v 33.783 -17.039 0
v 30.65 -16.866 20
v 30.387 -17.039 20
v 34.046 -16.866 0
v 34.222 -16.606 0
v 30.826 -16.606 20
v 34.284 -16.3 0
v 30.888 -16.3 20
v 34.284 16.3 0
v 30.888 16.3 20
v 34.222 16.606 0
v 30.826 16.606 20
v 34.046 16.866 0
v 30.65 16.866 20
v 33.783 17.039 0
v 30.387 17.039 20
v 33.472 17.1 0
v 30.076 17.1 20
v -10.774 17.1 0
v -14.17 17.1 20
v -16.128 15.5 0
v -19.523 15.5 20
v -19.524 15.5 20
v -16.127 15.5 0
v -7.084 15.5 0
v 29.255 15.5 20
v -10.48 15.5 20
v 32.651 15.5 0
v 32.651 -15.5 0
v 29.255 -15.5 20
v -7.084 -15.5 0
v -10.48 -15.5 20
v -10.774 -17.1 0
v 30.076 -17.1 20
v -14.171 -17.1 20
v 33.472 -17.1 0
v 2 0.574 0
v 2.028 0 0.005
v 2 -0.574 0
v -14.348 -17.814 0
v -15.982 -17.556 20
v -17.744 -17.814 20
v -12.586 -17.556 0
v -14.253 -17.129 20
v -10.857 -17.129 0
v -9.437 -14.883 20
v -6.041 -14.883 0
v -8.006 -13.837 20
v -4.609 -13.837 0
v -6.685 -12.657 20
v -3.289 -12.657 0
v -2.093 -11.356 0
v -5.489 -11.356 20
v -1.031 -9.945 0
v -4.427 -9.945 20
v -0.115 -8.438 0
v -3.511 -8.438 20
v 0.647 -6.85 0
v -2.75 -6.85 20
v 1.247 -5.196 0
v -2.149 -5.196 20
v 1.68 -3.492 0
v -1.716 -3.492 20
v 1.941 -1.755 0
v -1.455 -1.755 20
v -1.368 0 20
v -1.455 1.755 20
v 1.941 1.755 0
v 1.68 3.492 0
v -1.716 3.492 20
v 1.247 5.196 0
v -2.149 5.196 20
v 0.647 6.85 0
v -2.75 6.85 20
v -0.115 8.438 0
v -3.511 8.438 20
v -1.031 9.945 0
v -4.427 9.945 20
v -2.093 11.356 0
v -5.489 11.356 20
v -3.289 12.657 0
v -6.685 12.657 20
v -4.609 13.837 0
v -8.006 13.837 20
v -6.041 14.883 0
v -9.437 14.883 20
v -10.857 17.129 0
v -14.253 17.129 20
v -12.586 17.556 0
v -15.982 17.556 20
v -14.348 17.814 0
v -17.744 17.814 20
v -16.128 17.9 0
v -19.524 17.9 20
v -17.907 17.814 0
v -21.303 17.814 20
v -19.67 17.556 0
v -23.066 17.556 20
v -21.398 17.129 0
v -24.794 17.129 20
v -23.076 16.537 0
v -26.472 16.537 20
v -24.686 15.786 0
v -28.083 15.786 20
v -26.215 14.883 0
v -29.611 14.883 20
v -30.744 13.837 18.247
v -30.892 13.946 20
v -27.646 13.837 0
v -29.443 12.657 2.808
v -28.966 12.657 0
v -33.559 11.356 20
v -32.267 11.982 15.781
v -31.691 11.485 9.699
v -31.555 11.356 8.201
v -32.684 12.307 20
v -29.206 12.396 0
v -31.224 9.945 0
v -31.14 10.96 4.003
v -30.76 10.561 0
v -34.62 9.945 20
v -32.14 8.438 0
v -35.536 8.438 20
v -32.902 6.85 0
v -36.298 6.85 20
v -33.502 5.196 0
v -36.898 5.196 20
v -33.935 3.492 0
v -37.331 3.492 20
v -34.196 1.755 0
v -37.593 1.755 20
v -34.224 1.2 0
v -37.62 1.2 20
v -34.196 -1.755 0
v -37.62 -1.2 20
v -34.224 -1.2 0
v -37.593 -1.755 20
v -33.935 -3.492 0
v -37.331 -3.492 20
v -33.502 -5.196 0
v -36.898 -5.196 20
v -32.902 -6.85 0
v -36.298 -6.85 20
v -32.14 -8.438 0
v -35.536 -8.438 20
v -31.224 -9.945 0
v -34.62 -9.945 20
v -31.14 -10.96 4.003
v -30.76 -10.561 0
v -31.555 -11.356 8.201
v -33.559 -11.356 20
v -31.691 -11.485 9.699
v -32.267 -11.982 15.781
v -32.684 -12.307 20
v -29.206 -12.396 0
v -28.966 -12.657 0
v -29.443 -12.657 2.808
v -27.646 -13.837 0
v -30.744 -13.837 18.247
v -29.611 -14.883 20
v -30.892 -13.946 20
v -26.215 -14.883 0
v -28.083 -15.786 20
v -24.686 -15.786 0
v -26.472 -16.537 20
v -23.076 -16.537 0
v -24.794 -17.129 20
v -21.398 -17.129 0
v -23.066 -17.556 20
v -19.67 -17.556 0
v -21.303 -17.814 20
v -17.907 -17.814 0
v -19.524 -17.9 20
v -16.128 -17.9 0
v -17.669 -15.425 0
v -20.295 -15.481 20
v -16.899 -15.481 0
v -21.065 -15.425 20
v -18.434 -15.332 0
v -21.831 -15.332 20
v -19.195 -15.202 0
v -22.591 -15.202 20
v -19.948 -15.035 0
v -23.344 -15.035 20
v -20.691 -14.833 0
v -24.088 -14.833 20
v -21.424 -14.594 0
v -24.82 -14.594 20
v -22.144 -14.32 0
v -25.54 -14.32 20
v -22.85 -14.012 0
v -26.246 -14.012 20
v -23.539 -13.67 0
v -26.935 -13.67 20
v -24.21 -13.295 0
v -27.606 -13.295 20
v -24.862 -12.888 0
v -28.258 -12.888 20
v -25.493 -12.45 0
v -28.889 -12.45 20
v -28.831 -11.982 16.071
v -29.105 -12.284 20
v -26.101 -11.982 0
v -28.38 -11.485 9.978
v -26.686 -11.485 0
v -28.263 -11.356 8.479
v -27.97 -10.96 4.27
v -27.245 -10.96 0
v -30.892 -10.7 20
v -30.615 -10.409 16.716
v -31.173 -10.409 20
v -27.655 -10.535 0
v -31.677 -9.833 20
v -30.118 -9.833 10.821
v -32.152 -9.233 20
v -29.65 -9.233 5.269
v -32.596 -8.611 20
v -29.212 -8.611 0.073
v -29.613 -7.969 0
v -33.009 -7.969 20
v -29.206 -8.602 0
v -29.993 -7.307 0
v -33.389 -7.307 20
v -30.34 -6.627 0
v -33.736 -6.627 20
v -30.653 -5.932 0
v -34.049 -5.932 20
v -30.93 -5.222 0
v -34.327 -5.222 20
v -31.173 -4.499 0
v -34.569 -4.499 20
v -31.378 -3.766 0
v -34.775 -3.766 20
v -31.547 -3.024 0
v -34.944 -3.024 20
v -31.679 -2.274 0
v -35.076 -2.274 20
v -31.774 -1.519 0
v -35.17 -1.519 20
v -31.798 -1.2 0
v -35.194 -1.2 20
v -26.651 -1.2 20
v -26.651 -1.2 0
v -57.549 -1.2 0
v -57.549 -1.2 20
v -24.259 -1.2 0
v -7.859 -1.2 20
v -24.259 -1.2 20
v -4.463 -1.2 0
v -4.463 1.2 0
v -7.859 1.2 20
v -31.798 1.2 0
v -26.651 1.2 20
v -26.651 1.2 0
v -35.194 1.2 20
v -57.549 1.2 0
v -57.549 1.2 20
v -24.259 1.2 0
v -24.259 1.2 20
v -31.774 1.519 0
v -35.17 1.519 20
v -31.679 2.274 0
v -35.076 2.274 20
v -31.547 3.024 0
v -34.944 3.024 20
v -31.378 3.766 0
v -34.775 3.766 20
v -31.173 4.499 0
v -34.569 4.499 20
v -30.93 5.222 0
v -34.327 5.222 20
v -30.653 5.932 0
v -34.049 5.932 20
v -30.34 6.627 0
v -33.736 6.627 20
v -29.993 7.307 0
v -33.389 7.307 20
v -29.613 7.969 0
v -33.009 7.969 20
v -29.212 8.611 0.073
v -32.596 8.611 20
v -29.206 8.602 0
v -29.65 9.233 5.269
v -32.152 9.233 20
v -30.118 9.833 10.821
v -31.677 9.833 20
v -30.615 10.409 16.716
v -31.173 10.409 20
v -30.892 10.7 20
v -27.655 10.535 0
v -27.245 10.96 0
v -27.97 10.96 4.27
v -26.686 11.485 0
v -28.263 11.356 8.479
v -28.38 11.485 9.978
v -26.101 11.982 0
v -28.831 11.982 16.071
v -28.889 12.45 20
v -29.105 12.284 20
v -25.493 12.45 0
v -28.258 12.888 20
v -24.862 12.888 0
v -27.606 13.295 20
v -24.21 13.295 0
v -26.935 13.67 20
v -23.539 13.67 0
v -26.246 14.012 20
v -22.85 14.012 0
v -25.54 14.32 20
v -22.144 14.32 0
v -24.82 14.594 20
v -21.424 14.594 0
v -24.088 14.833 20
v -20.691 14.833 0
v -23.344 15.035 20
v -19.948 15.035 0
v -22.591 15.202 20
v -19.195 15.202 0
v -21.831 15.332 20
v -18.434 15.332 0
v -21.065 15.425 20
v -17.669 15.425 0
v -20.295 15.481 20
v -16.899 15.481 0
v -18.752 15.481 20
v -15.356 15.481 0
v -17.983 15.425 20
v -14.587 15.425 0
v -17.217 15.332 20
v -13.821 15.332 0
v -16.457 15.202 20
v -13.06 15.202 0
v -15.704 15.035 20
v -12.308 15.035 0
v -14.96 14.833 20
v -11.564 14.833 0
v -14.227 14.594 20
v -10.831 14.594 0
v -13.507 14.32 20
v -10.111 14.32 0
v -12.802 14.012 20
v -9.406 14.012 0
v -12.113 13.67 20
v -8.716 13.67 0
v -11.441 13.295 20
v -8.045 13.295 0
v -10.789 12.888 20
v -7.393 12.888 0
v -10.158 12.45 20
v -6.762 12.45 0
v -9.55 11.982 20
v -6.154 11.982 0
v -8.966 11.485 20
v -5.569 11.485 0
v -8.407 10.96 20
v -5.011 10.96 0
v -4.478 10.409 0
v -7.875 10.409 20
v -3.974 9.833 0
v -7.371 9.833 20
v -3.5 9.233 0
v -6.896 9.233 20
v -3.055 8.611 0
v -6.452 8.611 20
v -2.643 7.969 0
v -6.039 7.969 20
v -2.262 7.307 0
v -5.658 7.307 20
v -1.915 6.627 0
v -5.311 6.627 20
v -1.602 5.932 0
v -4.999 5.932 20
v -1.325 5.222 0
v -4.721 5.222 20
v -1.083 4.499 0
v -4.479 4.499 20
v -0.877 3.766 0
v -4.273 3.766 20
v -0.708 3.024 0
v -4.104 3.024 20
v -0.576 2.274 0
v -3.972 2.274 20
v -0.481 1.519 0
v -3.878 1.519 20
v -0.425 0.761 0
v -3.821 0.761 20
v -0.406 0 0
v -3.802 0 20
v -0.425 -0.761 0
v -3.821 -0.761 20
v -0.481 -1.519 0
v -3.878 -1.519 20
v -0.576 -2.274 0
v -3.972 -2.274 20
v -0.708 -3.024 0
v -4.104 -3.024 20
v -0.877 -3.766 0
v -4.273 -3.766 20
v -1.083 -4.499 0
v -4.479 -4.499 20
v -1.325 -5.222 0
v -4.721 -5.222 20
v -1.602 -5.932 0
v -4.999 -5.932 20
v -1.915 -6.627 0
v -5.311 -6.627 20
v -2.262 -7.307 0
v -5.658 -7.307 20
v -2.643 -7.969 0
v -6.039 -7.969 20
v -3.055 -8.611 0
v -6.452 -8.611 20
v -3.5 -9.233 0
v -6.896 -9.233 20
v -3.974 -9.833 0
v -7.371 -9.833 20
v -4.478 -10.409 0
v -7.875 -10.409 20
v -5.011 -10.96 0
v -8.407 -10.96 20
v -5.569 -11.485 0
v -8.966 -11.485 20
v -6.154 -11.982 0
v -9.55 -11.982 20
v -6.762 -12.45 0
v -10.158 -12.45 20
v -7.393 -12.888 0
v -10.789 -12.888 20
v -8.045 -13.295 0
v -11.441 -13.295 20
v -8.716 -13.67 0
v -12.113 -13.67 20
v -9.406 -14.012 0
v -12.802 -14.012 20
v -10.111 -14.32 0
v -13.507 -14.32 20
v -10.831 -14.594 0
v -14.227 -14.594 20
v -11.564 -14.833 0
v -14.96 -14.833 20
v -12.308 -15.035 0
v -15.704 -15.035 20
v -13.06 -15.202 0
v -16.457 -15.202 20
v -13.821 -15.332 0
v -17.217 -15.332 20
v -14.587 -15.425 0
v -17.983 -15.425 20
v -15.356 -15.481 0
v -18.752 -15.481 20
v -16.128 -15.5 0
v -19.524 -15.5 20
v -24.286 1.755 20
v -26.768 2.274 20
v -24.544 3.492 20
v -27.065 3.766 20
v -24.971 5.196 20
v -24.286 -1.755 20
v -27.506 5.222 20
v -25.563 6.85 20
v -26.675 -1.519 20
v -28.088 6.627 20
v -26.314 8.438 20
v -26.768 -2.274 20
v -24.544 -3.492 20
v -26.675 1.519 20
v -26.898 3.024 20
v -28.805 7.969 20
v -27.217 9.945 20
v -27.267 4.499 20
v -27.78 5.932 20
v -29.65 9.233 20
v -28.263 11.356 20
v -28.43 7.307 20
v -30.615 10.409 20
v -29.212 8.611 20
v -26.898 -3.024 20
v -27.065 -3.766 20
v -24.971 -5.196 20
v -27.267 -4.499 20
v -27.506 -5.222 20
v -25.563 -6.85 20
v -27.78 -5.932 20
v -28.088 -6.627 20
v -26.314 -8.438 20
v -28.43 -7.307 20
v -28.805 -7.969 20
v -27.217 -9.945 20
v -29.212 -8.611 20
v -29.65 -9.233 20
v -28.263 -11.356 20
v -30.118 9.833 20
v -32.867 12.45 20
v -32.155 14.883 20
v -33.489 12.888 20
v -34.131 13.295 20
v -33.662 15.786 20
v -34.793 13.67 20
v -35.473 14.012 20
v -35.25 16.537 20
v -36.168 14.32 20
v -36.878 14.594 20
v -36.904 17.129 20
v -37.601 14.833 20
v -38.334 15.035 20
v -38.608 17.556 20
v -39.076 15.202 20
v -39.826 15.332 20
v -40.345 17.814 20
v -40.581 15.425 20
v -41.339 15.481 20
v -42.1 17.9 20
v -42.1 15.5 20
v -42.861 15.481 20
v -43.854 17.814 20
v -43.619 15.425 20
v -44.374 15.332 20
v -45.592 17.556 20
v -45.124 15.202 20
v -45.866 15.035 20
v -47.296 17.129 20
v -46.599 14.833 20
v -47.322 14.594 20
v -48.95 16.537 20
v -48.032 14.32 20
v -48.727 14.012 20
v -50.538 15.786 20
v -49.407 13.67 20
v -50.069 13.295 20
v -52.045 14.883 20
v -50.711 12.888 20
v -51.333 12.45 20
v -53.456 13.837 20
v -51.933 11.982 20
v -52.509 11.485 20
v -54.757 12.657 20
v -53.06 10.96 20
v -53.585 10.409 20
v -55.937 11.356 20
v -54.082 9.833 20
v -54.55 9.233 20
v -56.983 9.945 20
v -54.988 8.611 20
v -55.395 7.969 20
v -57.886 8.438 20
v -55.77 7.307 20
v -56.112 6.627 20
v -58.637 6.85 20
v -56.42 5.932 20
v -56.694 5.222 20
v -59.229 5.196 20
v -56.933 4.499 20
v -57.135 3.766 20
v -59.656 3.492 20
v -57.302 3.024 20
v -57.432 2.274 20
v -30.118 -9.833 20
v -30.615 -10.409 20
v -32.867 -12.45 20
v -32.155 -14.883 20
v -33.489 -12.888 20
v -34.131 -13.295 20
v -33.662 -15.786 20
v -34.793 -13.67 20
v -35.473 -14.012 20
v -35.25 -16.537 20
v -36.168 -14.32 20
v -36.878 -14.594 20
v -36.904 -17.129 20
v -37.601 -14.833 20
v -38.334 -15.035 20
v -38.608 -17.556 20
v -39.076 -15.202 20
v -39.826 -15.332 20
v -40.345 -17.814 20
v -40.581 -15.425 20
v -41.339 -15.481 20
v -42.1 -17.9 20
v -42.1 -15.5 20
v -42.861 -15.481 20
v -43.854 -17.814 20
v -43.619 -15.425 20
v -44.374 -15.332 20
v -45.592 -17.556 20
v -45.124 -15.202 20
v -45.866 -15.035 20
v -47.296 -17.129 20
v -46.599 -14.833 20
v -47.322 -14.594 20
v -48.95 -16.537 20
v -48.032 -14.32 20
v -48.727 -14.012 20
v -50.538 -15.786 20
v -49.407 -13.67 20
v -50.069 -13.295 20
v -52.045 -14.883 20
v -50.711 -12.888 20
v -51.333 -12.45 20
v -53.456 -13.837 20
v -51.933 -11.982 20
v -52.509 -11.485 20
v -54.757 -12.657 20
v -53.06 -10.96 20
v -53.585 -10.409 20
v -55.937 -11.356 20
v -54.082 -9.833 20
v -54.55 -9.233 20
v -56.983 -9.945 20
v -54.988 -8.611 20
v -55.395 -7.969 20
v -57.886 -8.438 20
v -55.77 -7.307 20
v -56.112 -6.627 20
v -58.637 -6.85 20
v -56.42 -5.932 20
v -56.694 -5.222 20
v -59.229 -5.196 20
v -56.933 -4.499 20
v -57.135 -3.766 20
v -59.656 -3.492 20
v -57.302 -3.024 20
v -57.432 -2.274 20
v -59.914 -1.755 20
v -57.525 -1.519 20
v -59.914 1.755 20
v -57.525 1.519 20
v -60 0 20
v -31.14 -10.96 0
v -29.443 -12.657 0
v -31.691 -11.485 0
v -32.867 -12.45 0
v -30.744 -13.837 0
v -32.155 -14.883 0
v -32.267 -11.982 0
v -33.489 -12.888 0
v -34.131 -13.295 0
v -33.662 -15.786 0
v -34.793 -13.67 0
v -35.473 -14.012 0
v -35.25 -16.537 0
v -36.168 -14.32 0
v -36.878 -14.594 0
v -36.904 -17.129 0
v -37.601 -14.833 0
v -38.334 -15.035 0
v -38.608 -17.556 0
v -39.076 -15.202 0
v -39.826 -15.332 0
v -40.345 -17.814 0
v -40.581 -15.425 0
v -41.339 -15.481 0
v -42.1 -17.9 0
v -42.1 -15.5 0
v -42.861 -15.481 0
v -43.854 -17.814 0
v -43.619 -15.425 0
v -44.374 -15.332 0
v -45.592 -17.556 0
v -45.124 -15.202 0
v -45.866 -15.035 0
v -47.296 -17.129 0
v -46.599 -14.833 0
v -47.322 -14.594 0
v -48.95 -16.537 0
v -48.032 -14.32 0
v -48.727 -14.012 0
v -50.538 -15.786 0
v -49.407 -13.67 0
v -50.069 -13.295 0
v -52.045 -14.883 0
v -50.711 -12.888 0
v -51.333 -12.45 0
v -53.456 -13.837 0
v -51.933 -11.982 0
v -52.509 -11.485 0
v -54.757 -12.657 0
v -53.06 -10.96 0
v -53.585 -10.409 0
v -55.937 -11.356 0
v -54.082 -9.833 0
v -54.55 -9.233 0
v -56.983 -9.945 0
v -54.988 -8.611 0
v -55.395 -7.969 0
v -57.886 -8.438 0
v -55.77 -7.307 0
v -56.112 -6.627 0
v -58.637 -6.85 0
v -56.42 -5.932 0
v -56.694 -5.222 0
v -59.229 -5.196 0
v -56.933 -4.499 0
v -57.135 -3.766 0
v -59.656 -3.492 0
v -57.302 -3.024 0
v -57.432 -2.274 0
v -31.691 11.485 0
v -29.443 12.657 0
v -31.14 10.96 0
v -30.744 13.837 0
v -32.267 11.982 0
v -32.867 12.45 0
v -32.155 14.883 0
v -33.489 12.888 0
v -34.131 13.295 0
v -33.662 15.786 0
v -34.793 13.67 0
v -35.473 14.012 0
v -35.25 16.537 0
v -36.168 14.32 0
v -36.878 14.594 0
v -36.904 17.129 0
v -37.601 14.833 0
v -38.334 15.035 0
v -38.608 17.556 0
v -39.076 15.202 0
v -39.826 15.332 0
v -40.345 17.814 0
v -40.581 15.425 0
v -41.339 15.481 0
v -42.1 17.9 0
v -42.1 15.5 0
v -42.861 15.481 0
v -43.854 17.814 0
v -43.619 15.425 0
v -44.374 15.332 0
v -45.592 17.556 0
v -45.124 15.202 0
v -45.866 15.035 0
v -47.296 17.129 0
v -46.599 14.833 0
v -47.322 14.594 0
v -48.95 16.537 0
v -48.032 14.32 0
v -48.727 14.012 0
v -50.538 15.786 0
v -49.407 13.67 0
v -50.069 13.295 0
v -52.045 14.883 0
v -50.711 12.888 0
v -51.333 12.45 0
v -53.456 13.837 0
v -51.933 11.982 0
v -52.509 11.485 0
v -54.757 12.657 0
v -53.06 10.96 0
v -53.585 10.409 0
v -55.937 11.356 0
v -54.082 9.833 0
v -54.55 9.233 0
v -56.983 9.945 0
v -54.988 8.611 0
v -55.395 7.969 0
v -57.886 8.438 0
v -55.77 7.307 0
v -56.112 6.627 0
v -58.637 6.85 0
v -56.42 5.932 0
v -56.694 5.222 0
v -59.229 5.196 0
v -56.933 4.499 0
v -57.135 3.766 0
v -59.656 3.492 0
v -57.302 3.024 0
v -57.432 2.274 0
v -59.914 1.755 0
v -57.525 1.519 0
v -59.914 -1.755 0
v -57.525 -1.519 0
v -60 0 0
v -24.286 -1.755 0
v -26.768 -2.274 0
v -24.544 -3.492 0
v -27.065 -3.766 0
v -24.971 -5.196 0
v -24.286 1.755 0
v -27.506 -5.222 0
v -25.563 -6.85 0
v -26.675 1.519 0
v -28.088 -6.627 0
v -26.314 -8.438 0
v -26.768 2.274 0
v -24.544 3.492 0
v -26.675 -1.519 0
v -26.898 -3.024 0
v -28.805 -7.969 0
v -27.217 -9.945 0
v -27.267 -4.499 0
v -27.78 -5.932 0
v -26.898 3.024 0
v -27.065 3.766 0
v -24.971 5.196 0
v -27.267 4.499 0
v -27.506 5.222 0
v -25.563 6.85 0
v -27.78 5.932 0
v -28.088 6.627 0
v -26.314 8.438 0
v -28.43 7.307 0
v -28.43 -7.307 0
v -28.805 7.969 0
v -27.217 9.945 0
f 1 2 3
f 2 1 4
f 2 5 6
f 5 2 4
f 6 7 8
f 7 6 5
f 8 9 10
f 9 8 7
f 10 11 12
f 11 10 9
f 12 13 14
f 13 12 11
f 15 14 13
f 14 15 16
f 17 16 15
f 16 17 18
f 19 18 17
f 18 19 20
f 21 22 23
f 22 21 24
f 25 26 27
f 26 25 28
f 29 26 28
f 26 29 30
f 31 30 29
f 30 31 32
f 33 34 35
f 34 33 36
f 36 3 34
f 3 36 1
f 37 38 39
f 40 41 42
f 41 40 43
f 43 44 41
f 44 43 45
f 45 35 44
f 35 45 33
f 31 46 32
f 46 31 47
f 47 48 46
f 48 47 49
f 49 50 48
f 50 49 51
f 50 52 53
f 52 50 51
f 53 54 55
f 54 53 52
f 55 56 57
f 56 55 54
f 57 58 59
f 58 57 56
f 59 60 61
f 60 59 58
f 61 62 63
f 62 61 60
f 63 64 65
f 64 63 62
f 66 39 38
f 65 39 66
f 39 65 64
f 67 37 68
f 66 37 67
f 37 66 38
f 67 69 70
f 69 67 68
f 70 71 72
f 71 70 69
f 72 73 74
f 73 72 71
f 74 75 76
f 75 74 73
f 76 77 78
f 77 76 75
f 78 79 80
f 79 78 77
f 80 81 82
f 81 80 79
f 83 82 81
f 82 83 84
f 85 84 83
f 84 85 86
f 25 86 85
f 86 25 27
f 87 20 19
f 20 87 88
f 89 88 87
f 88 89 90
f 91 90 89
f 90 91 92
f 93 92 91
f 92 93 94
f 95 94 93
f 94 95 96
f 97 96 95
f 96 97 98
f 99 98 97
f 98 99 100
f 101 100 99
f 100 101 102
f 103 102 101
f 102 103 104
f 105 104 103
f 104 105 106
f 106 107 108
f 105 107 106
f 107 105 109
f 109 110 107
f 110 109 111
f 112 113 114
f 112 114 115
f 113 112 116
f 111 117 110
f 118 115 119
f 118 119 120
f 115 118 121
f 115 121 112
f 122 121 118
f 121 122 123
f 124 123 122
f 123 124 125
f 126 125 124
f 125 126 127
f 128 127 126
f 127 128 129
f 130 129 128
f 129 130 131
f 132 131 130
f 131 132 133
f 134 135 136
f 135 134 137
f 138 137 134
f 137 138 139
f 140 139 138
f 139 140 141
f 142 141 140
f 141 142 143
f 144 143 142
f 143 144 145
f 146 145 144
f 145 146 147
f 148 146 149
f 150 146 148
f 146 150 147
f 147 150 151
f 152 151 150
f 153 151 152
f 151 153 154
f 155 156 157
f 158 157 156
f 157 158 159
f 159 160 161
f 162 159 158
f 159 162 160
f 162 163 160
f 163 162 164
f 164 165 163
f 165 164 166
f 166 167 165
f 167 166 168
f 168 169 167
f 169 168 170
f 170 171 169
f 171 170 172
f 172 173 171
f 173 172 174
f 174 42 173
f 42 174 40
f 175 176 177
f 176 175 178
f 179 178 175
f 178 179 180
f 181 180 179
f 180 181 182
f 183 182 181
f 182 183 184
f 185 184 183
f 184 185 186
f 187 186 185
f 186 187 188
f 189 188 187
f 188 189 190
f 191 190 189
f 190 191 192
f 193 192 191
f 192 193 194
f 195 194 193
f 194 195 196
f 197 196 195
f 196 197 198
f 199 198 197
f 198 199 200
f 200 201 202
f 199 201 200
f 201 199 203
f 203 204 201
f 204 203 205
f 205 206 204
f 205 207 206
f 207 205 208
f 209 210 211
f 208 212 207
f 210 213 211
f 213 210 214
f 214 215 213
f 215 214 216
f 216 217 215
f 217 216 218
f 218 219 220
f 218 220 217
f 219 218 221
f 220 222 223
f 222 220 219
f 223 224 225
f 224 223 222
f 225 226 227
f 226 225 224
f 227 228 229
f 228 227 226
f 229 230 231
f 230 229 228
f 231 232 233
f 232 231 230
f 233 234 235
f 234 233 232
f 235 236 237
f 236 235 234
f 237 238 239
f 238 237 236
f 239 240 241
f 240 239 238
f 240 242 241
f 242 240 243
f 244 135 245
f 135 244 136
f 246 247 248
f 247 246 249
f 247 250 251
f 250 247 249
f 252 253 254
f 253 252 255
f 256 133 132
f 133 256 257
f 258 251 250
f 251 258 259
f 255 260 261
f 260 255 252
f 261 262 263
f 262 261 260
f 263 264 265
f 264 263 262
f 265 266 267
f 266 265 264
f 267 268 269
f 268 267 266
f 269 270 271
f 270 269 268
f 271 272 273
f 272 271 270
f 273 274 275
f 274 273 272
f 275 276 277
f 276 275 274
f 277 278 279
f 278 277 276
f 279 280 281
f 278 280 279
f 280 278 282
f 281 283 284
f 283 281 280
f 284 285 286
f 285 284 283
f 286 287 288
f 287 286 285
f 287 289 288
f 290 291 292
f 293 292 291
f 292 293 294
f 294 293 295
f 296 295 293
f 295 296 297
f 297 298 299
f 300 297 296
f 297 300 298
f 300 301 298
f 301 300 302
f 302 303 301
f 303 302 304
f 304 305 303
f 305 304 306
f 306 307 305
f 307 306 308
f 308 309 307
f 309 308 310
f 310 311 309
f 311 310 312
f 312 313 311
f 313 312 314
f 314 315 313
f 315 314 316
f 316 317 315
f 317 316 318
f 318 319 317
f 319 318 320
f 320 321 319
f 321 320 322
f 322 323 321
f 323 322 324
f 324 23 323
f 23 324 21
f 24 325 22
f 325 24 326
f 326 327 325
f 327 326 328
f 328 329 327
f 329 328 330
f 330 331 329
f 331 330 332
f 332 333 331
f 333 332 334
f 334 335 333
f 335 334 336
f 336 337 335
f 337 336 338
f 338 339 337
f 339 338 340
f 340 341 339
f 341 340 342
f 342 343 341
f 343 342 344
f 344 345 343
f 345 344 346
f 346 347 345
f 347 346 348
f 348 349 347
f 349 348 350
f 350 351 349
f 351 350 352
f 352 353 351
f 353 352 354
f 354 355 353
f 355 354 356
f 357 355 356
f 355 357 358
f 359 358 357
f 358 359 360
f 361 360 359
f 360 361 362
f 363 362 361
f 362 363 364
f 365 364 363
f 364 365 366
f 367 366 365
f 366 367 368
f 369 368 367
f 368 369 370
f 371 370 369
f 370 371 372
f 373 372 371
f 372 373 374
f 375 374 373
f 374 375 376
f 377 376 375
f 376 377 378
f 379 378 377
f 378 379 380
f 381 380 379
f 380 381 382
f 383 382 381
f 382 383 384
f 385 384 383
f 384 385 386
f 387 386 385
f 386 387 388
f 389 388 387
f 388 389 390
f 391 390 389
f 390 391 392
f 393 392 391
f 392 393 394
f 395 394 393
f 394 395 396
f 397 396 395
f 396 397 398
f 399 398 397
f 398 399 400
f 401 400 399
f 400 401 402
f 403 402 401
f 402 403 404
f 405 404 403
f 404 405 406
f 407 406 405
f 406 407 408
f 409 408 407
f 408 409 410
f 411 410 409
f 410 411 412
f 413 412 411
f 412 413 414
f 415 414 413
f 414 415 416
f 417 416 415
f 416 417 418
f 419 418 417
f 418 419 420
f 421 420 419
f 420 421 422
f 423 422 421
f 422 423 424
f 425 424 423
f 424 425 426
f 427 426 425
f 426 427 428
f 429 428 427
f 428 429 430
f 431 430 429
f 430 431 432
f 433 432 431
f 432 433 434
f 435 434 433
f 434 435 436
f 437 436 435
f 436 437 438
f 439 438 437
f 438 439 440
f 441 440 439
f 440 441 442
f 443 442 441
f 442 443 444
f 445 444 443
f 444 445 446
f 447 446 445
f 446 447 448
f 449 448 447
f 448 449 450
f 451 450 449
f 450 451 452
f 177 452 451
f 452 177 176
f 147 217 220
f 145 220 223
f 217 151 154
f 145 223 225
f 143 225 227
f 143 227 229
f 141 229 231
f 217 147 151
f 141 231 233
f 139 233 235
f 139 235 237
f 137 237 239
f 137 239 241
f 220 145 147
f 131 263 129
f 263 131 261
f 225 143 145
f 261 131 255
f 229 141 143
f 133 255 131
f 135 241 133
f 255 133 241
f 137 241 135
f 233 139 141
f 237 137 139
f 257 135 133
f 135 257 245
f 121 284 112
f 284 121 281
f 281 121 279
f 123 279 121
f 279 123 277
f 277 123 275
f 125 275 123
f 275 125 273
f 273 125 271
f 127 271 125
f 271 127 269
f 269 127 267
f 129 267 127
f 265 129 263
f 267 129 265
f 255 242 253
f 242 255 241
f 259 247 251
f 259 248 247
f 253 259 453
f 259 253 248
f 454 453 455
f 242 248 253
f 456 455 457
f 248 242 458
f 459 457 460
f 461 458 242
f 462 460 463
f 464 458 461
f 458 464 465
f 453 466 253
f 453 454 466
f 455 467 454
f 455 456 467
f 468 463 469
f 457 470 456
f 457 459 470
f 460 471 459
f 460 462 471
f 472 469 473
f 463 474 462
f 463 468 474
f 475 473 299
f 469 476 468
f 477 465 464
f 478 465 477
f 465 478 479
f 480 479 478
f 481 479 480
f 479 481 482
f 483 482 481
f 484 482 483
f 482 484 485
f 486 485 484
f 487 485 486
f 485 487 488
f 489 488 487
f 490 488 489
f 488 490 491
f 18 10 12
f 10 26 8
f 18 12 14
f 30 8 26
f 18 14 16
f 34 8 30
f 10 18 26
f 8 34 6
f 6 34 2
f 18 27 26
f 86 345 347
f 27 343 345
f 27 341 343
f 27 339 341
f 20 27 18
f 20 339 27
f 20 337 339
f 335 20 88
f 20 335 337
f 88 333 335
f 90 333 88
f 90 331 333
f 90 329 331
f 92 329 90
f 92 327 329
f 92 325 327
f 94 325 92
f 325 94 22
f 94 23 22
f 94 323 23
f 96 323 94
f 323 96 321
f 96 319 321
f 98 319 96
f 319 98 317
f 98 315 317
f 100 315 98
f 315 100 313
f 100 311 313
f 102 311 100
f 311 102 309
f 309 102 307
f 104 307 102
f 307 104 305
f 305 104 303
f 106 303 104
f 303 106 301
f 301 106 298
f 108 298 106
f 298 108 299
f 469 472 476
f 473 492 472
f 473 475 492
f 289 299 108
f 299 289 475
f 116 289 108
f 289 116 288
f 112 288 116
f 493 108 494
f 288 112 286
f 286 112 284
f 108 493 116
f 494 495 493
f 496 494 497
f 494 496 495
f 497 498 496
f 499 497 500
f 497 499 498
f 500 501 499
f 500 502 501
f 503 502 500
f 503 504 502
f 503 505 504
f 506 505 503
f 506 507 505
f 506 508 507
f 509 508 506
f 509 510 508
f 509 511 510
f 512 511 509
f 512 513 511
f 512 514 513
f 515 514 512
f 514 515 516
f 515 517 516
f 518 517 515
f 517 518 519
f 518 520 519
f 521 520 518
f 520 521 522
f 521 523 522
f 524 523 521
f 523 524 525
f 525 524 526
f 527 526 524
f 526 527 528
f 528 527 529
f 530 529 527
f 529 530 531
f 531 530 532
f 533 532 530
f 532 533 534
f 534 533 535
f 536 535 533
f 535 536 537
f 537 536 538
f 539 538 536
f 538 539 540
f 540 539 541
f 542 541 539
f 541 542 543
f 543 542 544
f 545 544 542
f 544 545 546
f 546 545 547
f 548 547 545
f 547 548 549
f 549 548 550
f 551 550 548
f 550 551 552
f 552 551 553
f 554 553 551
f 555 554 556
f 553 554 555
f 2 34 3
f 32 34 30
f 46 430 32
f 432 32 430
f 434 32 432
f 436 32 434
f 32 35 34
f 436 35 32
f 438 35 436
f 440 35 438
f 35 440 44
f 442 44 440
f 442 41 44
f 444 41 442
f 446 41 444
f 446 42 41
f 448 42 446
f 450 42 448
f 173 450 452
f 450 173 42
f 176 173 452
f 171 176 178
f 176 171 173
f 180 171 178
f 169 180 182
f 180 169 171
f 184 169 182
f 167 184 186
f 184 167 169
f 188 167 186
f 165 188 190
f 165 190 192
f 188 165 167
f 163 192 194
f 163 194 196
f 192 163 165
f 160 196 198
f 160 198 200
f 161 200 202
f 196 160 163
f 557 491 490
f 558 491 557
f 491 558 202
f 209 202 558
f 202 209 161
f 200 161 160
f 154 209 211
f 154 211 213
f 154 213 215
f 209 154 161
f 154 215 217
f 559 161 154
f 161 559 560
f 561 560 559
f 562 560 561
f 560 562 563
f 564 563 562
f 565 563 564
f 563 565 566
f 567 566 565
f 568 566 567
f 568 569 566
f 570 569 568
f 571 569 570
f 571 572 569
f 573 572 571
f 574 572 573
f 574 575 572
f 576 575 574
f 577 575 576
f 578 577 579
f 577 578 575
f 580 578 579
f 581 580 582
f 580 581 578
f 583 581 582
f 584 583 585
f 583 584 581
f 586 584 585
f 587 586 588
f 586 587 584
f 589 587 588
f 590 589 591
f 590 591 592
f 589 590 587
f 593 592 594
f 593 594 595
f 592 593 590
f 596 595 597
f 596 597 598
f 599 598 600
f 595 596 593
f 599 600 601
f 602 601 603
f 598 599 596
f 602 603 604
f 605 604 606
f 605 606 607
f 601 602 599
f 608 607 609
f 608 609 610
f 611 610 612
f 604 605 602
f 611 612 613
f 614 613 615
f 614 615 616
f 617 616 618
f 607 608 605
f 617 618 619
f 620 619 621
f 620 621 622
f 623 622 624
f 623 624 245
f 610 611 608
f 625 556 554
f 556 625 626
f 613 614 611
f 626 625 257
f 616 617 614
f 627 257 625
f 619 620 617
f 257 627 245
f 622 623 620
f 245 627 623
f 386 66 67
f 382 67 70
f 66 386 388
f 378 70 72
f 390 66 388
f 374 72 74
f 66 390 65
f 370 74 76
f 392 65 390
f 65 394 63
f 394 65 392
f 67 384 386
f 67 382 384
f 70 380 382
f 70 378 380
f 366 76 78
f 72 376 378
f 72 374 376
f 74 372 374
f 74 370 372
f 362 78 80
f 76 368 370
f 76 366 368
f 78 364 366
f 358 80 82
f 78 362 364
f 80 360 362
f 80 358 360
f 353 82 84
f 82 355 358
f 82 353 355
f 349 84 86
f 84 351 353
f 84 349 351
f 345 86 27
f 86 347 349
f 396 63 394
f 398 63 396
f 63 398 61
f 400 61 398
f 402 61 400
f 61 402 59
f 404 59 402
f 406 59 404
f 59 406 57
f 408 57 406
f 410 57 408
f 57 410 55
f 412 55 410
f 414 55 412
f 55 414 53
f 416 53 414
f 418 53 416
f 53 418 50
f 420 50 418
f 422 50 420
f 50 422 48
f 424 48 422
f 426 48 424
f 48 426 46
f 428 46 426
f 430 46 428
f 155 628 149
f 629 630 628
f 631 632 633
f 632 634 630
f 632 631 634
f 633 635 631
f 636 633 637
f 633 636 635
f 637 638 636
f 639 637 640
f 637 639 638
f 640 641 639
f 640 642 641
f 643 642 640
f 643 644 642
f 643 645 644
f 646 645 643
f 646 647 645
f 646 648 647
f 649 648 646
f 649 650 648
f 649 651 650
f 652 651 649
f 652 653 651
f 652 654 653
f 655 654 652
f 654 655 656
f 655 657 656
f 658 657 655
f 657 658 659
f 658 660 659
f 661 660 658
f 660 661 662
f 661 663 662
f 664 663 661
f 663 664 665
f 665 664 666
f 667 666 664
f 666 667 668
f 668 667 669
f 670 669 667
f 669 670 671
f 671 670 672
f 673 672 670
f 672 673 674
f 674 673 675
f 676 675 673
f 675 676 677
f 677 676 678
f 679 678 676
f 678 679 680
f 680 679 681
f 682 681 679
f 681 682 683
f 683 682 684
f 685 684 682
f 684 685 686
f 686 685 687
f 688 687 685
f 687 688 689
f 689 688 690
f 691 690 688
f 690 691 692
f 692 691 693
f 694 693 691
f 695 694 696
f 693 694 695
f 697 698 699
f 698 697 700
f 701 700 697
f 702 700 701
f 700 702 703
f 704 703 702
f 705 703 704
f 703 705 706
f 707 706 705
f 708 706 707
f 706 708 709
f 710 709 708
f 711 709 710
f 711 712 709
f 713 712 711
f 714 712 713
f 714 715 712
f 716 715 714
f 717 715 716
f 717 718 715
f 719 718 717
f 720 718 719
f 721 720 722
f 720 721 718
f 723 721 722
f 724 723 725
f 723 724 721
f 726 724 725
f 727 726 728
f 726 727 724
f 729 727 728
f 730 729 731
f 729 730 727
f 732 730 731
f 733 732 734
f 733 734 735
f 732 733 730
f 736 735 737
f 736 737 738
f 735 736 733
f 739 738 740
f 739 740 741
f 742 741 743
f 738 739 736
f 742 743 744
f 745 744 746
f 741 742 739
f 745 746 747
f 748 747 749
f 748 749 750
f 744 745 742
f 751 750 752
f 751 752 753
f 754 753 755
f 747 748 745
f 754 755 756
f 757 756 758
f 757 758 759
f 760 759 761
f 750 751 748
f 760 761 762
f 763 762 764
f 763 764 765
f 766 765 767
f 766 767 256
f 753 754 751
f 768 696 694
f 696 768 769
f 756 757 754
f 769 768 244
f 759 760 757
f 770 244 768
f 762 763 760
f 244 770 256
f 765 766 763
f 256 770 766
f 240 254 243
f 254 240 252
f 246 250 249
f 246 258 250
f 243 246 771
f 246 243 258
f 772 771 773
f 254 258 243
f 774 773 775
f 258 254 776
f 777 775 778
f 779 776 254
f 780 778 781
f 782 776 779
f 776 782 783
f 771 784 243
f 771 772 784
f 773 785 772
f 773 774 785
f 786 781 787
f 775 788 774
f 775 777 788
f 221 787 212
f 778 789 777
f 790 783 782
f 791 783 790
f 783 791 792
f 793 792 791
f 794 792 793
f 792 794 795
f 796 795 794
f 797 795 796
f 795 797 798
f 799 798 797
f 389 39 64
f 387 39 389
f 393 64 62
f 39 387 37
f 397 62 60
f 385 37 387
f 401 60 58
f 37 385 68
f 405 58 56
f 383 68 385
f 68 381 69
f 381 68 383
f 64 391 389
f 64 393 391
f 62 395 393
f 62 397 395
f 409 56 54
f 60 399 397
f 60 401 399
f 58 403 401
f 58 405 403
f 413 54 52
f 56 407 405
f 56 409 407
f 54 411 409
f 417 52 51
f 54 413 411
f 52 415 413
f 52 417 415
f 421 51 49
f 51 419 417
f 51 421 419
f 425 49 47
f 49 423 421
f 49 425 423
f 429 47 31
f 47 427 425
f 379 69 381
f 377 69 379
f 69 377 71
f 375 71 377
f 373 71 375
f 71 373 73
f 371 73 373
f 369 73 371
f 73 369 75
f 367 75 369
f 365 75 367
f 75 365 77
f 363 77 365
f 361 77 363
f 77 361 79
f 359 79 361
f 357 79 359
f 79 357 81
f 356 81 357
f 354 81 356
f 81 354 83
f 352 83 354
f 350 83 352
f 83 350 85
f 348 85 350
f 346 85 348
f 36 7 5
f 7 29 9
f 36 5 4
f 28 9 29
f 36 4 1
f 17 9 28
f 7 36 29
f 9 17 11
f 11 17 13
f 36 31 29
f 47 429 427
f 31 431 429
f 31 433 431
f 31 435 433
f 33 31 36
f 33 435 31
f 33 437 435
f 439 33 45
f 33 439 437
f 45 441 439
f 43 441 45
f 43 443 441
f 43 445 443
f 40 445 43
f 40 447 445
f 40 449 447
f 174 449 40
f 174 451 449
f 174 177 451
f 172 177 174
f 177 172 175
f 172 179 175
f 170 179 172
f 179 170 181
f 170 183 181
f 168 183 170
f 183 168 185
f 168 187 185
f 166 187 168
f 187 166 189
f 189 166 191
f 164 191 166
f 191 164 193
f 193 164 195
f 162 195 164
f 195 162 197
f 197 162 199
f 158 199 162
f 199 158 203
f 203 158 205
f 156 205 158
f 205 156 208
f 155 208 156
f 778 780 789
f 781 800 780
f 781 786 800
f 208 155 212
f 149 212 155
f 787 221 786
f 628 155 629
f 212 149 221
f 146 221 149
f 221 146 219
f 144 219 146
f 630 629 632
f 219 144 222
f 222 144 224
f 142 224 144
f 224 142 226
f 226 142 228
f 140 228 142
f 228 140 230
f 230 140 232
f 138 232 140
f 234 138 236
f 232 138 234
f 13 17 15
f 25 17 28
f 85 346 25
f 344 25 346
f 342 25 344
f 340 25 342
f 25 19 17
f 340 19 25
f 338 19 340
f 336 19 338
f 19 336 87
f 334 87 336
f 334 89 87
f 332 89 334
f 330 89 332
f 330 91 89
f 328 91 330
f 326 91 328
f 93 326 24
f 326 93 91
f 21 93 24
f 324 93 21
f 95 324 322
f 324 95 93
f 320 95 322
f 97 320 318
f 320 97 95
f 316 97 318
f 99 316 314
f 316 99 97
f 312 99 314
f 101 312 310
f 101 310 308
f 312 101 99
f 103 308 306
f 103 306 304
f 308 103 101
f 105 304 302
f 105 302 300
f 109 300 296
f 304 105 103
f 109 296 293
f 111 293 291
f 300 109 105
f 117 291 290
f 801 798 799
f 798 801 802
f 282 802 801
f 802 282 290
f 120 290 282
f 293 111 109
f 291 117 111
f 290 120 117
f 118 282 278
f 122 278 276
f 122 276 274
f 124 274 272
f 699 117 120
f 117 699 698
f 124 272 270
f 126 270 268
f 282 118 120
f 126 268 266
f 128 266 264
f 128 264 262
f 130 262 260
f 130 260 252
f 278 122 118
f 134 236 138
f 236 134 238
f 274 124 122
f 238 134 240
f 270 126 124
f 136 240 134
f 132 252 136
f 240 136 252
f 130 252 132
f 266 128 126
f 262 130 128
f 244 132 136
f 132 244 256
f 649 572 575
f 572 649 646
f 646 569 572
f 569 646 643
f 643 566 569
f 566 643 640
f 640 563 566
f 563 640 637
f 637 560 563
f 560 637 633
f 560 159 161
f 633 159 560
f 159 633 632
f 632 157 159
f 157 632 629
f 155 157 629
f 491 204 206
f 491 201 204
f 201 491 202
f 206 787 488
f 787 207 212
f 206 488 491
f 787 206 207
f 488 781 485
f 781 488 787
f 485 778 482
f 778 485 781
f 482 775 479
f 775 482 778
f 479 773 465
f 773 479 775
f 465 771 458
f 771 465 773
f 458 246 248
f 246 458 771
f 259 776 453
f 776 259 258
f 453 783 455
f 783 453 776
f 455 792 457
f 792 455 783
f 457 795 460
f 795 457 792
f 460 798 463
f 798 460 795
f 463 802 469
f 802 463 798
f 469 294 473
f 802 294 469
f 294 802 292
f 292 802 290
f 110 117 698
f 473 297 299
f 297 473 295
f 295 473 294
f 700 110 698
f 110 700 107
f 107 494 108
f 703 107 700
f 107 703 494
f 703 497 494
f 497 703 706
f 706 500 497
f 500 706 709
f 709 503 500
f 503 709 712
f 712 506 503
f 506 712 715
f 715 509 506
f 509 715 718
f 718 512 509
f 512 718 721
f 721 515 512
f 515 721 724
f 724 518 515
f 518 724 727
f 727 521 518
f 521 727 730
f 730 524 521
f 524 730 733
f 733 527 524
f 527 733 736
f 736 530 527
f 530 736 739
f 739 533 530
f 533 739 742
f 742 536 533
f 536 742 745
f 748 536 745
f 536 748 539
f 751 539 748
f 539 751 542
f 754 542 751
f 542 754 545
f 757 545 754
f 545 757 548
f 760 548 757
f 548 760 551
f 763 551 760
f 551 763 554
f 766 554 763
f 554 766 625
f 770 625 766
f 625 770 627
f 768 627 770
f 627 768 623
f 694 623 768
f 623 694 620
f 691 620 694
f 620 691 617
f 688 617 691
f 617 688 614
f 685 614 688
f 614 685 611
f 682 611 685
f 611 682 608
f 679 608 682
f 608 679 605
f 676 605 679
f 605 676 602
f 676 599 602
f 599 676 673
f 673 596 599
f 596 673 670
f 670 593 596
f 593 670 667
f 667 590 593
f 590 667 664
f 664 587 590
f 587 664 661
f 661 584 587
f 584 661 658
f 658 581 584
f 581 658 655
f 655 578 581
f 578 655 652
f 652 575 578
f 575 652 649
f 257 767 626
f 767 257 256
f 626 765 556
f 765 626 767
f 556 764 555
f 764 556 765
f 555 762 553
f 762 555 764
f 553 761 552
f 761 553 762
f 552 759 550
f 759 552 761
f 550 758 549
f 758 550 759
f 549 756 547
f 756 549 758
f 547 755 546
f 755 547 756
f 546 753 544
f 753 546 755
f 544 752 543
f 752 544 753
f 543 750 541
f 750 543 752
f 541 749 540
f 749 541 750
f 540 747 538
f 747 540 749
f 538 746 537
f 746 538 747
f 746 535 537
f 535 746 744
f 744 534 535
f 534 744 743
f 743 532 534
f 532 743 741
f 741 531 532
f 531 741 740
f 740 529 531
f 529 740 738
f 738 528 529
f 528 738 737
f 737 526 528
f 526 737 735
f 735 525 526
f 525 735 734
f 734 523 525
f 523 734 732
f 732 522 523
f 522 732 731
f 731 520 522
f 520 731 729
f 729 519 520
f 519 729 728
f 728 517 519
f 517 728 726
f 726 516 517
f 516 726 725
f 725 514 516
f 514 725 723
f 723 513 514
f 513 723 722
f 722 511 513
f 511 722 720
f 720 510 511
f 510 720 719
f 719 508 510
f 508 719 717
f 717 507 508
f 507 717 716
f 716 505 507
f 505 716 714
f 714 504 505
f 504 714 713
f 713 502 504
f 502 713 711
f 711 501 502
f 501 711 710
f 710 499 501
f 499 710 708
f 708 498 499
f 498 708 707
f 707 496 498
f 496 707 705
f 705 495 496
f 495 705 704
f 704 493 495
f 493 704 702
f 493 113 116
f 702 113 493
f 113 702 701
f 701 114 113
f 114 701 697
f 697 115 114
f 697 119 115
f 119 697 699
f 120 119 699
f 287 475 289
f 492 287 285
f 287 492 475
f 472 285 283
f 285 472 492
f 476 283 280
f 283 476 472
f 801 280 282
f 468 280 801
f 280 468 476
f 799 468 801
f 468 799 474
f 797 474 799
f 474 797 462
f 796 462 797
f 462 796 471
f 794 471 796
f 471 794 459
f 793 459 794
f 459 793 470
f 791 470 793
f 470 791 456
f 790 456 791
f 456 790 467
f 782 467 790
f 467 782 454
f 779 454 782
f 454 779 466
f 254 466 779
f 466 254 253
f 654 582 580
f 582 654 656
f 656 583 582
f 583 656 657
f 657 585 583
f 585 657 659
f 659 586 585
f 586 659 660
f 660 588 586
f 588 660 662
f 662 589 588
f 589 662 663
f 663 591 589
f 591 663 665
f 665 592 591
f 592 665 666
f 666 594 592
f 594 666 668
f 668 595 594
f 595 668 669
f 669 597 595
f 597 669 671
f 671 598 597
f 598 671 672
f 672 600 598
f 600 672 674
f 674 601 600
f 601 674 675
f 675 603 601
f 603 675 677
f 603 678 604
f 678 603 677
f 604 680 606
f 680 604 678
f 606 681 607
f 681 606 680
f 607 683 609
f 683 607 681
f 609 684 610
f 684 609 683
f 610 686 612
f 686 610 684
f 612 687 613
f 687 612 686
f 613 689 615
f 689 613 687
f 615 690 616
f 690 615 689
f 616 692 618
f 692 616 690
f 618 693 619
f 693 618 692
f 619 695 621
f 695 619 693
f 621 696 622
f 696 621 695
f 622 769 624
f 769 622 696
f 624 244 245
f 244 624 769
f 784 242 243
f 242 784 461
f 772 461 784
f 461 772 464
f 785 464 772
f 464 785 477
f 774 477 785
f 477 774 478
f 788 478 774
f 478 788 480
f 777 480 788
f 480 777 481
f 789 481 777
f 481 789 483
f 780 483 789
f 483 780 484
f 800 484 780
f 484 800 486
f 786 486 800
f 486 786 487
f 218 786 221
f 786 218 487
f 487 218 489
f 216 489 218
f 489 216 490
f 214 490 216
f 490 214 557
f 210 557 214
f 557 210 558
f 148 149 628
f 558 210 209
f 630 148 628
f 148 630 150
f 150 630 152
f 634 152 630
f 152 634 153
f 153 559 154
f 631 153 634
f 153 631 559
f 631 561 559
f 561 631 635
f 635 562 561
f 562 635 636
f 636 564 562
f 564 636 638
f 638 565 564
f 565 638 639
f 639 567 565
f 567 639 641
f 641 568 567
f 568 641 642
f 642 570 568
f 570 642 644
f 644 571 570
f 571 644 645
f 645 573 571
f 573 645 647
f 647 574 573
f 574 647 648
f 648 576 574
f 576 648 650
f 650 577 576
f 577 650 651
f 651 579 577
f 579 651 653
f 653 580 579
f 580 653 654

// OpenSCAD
LEG_DEPTH = 33; //[10:60]
LEG_WIDTH = 31; //[10:60]
LEG_SLOPE = atan(9/53); //[0:0.5:30]
LEG_OVERLAP = 2; //[0:0.5:5]
//Distance from back of chair leg to wall
BUMP = 60; //[40:80]
//Height of bumper
LEG_HEIGHT = 20;// [40]


//Wall thickness of bumper
WALL2 = 2.4; // [1.2:5]
//Wall thickness, think wall around chair leg
WALL1 = 1.6;//[0.6:2.4]
//min Radius
MR = 1; 

/* [Hidden] */
e = 0.01;
echo(LEG_SLOPE=LEG_SLOPE);
$fn = 16;

//front strap for chair
intersection(){
	translate([0,0,LEG_HEIGHT/2])
	cube([LEG_WIDTH*3,LEG_WIDTH*3,LEG_HEIGHT],center=true);
	
	extraHeight = LEG_WIDTH*sin(LEG_SLOPE)*2;
rotate([0,-LEG_SLOPE,0]){
	translate([0,0,-extraHeight])
	linear_extrude(LEG_HEIGHT+extraHeight*2, convexity = 4)
	translate([0,-0.5*(LEG_WIDTH+WALL1)])
	difference(){
	offset(r=WALL1/2)
		translate([-LEG_DEPTH*0.5,0])
			square([LEG_DEPTH*1.5,LEG_WIDTH+WALL1]);
		
		translate([-LEG_DEPTH*0.5-WALL1/2-e,WALL1/2])
			square([LEG_DEPTH*1.5,LEG_WIDTH]);
	}
	
	translate([0,0,-LEG_OVERLAP*sin(LEG_SLOPE)])
	linear_extrude(LEG_HEIGHT+extraHeight, convexity = 2)
	translate([-LEG_WIDTH/2-WALL2+LEG_OVERLAP,0])
		legWidthCircle(-LEG_OVERLAP*2);

}//rotate
}//intersection

module legWidthCircle(gap=WALL2){
	difference(){
		circle(d=LEG_WIDTH+WALL2*2, $fn=64);
		circle(d=LEG_WIDTH, $fn=128);	
	}
	translate([gap/2,0])
	square([LEG_WIDTH-abs(gap),WALL2], center=true);
}

for(xo = [//-BUMP/2+LEG_OVERLAP/2,
	-BUMP+LEG_WIDTH/2+WALL2])
	linear_extrude(LEG_HEIGHT, convexity = 2)
		translate([xo,0])
			legWidthCircle(0);
